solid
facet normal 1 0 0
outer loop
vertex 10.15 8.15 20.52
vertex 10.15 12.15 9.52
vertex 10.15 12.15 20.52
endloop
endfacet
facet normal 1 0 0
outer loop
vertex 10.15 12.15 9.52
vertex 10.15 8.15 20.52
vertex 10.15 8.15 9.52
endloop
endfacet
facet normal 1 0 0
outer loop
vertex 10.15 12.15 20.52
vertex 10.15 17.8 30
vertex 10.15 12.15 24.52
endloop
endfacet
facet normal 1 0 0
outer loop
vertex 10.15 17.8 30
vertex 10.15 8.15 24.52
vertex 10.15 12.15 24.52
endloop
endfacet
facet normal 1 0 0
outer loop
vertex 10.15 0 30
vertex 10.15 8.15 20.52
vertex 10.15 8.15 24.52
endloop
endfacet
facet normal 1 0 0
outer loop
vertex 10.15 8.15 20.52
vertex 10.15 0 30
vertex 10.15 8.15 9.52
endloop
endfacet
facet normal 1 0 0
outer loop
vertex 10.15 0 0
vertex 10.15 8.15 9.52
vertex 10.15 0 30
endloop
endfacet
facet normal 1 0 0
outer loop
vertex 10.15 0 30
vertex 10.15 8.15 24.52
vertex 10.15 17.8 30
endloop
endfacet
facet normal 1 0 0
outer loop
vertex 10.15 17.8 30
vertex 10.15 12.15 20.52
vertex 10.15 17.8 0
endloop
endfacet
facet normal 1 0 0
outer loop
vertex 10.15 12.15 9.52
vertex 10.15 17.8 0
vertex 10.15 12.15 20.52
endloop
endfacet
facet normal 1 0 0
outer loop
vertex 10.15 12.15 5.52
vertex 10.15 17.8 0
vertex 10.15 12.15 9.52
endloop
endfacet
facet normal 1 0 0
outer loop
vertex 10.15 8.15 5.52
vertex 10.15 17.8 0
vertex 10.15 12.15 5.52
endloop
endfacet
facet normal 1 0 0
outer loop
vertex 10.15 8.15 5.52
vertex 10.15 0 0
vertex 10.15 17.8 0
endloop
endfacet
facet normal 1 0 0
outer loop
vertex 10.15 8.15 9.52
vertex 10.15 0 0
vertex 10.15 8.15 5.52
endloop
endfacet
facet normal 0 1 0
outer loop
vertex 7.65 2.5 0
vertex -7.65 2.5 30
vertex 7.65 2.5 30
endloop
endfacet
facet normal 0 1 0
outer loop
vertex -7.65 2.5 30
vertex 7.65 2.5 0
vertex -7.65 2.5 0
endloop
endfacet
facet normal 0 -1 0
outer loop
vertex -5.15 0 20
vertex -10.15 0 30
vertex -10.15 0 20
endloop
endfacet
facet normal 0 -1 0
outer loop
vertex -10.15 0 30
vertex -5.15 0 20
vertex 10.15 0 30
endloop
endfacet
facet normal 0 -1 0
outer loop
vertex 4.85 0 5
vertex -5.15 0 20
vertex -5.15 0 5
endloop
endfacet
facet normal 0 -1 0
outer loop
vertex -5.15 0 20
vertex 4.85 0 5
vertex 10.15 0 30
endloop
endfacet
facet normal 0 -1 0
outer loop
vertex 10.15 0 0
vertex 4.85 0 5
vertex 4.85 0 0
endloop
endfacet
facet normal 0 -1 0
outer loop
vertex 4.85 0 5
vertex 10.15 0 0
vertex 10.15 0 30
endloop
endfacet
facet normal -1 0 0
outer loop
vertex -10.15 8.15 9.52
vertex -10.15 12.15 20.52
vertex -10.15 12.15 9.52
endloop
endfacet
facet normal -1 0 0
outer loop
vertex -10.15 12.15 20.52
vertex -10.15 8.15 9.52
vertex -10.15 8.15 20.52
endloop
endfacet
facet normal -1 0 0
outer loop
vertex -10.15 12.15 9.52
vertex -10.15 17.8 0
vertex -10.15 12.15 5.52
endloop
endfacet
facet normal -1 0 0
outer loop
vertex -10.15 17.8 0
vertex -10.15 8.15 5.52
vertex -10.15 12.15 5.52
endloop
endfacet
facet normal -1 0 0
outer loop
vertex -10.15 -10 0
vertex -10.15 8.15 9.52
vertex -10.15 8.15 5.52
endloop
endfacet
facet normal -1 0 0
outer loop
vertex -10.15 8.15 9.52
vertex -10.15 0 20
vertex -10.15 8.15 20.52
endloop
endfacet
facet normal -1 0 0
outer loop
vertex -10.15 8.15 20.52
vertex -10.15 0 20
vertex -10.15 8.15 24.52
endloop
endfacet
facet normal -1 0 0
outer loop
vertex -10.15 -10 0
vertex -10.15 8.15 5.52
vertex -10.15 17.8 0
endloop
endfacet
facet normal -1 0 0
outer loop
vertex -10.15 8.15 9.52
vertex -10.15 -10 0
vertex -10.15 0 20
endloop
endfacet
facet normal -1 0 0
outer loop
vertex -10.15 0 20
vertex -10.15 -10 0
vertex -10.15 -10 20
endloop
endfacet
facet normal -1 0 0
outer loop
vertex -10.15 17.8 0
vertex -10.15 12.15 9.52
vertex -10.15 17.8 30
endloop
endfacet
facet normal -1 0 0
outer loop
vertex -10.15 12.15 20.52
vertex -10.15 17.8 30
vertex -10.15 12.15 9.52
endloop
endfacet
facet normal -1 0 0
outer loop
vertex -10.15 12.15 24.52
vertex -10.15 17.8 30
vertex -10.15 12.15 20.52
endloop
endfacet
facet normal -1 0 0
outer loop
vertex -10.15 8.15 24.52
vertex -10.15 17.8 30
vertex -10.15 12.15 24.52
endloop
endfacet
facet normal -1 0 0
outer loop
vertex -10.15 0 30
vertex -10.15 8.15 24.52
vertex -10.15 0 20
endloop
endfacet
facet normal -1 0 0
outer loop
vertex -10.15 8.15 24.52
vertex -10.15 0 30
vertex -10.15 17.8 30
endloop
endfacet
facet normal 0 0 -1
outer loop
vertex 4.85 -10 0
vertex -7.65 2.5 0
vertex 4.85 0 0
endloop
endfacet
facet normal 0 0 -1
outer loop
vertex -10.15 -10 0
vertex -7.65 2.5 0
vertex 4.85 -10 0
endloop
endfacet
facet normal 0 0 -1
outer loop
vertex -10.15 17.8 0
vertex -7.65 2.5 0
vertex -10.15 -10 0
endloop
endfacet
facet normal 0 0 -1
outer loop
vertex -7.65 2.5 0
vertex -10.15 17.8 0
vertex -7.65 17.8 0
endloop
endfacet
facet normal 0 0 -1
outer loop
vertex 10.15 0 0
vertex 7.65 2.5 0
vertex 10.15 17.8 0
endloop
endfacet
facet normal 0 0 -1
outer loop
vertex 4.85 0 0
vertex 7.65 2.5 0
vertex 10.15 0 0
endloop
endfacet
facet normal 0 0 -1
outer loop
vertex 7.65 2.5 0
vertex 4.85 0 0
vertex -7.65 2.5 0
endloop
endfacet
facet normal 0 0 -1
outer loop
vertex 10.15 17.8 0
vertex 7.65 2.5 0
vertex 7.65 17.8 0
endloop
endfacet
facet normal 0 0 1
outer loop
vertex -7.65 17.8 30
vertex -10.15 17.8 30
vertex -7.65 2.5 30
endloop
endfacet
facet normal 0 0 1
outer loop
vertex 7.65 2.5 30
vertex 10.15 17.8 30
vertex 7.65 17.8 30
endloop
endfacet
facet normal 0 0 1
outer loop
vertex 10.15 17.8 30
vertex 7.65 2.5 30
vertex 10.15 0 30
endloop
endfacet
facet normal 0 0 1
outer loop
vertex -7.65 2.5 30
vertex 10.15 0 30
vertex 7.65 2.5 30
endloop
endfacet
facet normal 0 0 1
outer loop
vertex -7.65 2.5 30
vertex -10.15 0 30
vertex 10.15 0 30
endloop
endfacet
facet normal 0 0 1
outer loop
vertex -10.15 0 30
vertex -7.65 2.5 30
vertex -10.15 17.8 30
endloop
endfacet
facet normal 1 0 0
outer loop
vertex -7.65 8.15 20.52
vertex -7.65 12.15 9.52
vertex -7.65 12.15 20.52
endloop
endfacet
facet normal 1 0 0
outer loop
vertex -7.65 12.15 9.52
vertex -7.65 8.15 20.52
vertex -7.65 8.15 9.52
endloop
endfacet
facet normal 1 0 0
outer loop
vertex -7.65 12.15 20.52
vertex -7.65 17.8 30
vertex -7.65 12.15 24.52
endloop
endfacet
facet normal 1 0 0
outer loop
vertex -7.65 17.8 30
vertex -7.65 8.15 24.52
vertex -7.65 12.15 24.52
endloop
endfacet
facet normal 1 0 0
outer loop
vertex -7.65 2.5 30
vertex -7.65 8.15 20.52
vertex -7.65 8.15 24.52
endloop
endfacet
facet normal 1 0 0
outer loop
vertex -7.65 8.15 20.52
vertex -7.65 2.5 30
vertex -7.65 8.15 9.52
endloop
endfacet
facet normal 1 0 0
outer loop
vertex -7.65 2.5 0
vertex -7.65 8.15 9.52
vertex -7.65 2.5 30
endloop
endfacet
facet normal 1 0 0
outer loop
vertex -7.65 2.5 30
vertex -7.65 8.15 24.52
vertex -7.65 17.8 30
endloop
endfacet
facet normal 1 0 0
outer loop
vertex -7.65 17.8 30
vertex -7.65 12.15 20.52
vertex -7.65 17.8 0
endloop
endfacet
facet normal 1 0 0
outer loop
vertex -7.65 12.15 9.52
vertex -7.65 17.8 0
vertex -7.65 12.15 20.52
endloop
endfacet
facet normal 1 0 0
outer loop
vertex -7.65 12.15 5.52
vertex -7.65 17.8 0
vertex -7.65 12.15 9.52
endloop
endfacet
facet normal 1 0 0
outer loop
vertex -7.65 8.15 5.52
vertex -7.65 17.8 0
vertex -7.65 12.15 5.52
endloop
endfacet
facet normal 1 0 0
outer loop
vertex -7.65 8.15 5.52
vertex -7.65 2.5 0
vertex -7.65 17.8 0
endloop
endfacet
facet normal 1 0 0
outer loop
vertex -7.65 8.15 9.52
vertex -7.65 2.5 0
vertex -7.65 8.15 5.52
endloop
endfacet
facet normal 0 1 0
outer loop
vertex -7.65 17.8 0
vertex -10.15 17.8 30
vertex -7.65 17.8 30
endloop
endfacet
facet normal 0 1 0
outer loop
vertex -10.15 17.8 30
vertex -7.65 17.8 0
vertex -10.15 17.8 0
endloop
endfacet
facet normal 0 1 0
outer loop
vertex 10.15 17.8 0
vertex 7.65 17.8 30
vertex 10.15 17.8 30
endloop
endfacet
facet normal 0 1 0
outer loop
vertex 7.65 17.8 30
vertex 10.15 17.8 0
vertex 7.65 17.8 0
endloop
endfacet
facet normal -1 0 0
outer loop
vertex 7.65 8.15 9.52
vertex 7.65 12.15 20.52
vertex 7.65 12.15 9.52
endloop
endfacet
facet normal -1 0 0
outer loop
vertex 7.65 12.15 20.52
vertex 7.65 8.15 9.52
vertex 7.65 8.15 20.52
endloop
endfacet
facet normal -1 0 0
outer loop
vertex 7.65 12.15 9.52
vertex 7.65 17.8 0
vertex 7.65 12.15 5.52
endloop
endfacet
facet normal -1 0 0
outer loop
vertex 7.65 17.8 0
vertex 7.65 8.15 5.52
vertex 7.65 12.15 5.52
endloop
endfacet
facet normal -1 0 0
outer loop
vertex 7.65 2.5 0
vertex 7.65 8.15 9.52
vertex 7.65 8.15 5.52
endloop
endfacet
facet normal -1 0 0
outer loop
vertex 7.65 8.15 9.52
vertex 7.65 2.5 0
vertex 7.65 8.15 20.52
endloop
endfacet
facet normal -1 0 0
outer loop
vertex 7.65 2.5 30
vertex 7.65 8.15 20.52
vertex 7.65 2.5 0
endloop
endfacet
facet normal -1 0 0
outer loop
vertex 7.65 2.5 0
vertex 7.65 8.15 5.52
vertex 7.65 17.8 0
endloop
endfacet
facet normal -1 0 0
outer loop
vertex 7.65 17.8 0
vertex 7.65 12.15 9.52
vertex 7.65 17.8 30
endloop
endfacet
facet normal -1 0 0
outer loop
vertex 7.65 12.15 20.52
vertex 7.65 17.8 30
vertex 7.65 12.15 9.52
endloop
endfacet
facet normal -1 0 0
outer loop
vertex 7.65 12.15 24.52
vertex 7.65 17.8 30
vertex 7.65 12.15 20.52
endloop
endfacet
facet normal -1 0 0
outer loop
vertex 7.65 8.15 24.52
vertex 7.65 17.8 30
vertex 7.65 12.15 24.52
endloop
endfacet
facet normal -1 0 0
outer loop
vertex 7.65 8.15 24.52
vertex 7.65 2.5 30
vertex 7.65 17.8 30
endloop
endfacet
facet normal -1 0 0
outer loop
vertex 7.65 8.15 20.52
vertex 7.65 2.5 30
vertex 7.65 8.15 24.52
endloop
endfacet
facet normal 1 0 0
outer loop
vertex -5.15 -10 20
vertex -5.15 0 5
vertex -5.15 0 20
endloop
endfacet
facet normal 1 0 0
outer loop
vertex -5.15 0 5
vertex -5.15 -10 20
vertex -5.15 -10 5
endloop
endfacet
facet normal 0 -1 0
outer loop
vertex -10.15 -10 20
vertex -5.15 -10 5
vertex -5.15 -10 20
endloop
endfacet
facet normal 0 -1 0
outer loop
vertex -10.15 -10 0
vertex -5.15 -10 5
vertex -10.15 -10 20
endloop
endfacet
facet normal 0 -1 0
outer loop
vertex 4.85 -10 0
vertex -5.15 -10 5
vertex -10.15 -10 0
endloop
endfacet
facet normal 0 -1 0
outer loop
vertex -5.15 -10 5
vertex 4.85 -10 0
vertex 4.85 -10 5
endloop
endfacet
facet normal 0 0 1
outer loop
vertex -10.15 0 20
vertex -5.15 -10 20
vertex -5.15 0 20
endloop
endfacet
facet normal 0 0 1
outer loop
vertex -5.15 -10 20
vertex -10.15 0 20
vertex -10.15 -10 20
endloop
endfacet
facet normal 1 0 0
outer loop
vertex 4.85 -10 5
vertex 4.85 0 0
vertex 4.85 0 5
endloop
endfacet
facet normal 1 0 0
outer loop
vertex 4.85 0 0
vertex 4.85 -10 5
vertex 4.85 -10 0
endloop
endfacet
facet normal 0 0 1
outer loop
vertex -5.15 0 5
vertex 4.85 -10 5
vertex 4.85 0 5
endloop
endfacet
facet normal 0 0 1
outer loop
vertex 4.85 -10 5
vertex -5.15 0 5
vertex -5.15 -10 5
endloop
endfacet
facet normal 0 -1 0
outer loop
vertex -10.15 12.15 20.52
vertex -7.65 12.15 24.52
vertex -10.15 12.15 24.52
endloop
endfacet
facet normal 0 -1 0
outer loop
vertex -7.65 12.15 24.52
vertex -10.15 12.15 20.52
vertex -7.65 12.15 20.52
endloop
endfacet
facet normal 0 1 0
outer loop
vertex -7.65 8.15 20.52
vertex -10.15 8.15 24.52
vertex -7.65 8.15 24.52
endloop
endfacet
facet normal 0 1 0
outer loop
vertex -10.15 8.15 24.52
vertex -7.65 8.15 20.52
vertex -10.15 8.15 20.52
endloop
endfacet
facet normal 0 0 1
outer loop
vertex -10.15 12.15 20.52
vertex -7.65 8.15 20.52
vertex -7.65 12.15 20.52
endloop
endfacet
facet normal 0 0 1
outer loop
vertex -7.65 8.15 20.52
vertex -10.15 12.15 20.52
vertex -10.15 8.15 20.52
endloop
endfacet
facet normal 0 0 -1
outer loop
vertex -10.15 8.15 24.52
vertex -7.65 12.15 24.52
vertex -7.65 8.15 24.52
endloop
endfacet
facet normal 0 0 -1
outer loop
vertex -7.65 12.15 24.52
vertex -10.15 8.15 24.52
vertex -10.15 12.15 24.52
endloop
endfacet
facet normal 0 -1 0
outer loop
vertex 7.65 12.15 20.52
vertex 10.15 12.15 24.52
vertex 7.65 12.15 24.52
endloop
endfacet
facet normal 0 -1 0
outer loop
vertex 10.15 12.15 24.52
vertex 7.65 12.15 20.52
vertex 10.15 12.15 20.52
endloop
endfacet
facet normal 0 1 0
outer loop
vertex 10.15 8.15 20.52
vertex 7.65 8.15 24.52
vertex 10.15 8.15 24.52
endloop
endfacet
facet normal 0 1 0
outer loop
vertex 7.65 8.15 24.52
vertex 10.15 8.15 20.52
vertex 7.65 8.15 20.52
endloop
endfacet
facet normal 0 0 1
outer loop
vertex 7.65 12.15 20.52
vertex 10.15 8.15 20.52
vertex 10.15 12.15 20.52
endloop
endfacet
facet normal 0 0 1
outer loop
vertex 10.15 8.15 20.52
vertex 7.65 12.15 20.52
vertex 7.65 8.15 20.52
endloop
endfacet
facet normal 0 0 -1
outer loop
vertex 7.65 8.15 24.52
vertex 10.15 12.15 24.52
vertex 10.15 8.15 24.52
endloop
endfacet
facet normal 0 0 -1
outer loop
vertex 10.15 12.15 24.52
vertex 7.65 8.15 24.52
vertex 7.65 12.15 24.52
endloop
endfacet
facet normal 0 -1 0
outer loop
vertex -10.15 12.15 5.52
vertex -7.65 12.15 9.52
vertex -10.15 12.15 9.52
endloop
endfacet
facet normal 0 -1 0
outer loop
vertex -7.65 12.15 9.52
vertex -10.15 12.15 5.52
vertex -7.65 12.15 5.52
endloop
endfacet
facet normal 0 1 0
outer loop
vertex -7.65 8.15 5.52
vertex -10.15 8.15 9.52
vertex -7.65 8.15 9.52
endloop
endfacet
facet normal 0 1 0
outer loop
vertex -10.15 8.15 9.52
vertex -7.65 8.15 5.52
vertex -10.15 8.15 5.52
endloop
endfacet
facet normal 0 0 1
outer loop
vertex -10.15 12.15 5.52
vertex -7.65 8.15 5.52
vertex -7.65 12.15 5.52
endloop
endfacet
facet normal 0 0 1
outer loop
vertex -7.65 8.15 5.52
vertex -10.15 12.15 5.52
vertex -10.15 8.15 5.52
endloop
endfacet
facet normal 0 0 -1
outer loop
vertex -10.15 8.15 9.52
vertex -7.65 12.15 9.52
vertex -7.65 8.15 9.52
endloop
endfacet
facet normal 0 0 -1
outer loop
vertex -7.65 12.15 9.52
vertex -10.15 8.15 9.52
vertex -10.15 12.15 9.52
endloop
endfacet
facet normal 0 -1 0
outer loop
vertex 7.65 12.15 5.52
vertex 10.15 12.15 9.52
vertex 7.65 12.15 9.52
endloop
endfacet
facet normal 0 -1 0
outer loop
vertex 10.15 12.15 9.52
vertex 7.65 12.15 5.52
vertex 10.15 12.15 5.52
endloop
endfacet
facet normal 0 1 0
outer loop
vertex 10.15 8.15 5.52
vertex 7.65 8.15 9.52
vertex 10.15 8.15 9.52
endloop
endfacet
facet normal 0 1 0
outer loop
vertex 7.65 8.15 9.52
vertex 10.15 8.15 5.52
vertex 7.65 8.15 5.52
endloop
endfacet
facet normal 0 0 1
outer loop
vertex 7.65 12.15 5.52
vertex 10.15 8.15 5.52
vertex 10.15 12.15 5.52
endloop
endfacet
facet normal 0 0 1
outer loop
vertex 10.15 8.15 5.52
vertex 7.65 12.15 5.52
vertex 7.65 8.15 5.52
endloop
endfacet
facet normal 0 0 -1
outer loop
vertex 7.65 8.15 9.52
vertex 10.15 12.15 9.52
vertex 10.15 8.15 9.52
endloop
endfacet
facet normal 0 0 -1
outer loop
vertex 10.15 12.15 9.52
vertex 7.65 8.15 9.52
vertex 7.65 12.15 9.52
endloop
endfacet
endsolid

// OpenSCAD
// HomeRacker switch corner bracket - catches one corner of the switch.
// Print TWO of these (for one rail) plus two of the mirrored version
// (for the other rail) - see _homeracker_switch_corner_bracket_lib.scad
// for the full design notes and _mirrored.scad for the other-side piece.
include <_homeracker_switch_corner_bracket_lib.scad>
render_bracket(mirror_piece = false);
